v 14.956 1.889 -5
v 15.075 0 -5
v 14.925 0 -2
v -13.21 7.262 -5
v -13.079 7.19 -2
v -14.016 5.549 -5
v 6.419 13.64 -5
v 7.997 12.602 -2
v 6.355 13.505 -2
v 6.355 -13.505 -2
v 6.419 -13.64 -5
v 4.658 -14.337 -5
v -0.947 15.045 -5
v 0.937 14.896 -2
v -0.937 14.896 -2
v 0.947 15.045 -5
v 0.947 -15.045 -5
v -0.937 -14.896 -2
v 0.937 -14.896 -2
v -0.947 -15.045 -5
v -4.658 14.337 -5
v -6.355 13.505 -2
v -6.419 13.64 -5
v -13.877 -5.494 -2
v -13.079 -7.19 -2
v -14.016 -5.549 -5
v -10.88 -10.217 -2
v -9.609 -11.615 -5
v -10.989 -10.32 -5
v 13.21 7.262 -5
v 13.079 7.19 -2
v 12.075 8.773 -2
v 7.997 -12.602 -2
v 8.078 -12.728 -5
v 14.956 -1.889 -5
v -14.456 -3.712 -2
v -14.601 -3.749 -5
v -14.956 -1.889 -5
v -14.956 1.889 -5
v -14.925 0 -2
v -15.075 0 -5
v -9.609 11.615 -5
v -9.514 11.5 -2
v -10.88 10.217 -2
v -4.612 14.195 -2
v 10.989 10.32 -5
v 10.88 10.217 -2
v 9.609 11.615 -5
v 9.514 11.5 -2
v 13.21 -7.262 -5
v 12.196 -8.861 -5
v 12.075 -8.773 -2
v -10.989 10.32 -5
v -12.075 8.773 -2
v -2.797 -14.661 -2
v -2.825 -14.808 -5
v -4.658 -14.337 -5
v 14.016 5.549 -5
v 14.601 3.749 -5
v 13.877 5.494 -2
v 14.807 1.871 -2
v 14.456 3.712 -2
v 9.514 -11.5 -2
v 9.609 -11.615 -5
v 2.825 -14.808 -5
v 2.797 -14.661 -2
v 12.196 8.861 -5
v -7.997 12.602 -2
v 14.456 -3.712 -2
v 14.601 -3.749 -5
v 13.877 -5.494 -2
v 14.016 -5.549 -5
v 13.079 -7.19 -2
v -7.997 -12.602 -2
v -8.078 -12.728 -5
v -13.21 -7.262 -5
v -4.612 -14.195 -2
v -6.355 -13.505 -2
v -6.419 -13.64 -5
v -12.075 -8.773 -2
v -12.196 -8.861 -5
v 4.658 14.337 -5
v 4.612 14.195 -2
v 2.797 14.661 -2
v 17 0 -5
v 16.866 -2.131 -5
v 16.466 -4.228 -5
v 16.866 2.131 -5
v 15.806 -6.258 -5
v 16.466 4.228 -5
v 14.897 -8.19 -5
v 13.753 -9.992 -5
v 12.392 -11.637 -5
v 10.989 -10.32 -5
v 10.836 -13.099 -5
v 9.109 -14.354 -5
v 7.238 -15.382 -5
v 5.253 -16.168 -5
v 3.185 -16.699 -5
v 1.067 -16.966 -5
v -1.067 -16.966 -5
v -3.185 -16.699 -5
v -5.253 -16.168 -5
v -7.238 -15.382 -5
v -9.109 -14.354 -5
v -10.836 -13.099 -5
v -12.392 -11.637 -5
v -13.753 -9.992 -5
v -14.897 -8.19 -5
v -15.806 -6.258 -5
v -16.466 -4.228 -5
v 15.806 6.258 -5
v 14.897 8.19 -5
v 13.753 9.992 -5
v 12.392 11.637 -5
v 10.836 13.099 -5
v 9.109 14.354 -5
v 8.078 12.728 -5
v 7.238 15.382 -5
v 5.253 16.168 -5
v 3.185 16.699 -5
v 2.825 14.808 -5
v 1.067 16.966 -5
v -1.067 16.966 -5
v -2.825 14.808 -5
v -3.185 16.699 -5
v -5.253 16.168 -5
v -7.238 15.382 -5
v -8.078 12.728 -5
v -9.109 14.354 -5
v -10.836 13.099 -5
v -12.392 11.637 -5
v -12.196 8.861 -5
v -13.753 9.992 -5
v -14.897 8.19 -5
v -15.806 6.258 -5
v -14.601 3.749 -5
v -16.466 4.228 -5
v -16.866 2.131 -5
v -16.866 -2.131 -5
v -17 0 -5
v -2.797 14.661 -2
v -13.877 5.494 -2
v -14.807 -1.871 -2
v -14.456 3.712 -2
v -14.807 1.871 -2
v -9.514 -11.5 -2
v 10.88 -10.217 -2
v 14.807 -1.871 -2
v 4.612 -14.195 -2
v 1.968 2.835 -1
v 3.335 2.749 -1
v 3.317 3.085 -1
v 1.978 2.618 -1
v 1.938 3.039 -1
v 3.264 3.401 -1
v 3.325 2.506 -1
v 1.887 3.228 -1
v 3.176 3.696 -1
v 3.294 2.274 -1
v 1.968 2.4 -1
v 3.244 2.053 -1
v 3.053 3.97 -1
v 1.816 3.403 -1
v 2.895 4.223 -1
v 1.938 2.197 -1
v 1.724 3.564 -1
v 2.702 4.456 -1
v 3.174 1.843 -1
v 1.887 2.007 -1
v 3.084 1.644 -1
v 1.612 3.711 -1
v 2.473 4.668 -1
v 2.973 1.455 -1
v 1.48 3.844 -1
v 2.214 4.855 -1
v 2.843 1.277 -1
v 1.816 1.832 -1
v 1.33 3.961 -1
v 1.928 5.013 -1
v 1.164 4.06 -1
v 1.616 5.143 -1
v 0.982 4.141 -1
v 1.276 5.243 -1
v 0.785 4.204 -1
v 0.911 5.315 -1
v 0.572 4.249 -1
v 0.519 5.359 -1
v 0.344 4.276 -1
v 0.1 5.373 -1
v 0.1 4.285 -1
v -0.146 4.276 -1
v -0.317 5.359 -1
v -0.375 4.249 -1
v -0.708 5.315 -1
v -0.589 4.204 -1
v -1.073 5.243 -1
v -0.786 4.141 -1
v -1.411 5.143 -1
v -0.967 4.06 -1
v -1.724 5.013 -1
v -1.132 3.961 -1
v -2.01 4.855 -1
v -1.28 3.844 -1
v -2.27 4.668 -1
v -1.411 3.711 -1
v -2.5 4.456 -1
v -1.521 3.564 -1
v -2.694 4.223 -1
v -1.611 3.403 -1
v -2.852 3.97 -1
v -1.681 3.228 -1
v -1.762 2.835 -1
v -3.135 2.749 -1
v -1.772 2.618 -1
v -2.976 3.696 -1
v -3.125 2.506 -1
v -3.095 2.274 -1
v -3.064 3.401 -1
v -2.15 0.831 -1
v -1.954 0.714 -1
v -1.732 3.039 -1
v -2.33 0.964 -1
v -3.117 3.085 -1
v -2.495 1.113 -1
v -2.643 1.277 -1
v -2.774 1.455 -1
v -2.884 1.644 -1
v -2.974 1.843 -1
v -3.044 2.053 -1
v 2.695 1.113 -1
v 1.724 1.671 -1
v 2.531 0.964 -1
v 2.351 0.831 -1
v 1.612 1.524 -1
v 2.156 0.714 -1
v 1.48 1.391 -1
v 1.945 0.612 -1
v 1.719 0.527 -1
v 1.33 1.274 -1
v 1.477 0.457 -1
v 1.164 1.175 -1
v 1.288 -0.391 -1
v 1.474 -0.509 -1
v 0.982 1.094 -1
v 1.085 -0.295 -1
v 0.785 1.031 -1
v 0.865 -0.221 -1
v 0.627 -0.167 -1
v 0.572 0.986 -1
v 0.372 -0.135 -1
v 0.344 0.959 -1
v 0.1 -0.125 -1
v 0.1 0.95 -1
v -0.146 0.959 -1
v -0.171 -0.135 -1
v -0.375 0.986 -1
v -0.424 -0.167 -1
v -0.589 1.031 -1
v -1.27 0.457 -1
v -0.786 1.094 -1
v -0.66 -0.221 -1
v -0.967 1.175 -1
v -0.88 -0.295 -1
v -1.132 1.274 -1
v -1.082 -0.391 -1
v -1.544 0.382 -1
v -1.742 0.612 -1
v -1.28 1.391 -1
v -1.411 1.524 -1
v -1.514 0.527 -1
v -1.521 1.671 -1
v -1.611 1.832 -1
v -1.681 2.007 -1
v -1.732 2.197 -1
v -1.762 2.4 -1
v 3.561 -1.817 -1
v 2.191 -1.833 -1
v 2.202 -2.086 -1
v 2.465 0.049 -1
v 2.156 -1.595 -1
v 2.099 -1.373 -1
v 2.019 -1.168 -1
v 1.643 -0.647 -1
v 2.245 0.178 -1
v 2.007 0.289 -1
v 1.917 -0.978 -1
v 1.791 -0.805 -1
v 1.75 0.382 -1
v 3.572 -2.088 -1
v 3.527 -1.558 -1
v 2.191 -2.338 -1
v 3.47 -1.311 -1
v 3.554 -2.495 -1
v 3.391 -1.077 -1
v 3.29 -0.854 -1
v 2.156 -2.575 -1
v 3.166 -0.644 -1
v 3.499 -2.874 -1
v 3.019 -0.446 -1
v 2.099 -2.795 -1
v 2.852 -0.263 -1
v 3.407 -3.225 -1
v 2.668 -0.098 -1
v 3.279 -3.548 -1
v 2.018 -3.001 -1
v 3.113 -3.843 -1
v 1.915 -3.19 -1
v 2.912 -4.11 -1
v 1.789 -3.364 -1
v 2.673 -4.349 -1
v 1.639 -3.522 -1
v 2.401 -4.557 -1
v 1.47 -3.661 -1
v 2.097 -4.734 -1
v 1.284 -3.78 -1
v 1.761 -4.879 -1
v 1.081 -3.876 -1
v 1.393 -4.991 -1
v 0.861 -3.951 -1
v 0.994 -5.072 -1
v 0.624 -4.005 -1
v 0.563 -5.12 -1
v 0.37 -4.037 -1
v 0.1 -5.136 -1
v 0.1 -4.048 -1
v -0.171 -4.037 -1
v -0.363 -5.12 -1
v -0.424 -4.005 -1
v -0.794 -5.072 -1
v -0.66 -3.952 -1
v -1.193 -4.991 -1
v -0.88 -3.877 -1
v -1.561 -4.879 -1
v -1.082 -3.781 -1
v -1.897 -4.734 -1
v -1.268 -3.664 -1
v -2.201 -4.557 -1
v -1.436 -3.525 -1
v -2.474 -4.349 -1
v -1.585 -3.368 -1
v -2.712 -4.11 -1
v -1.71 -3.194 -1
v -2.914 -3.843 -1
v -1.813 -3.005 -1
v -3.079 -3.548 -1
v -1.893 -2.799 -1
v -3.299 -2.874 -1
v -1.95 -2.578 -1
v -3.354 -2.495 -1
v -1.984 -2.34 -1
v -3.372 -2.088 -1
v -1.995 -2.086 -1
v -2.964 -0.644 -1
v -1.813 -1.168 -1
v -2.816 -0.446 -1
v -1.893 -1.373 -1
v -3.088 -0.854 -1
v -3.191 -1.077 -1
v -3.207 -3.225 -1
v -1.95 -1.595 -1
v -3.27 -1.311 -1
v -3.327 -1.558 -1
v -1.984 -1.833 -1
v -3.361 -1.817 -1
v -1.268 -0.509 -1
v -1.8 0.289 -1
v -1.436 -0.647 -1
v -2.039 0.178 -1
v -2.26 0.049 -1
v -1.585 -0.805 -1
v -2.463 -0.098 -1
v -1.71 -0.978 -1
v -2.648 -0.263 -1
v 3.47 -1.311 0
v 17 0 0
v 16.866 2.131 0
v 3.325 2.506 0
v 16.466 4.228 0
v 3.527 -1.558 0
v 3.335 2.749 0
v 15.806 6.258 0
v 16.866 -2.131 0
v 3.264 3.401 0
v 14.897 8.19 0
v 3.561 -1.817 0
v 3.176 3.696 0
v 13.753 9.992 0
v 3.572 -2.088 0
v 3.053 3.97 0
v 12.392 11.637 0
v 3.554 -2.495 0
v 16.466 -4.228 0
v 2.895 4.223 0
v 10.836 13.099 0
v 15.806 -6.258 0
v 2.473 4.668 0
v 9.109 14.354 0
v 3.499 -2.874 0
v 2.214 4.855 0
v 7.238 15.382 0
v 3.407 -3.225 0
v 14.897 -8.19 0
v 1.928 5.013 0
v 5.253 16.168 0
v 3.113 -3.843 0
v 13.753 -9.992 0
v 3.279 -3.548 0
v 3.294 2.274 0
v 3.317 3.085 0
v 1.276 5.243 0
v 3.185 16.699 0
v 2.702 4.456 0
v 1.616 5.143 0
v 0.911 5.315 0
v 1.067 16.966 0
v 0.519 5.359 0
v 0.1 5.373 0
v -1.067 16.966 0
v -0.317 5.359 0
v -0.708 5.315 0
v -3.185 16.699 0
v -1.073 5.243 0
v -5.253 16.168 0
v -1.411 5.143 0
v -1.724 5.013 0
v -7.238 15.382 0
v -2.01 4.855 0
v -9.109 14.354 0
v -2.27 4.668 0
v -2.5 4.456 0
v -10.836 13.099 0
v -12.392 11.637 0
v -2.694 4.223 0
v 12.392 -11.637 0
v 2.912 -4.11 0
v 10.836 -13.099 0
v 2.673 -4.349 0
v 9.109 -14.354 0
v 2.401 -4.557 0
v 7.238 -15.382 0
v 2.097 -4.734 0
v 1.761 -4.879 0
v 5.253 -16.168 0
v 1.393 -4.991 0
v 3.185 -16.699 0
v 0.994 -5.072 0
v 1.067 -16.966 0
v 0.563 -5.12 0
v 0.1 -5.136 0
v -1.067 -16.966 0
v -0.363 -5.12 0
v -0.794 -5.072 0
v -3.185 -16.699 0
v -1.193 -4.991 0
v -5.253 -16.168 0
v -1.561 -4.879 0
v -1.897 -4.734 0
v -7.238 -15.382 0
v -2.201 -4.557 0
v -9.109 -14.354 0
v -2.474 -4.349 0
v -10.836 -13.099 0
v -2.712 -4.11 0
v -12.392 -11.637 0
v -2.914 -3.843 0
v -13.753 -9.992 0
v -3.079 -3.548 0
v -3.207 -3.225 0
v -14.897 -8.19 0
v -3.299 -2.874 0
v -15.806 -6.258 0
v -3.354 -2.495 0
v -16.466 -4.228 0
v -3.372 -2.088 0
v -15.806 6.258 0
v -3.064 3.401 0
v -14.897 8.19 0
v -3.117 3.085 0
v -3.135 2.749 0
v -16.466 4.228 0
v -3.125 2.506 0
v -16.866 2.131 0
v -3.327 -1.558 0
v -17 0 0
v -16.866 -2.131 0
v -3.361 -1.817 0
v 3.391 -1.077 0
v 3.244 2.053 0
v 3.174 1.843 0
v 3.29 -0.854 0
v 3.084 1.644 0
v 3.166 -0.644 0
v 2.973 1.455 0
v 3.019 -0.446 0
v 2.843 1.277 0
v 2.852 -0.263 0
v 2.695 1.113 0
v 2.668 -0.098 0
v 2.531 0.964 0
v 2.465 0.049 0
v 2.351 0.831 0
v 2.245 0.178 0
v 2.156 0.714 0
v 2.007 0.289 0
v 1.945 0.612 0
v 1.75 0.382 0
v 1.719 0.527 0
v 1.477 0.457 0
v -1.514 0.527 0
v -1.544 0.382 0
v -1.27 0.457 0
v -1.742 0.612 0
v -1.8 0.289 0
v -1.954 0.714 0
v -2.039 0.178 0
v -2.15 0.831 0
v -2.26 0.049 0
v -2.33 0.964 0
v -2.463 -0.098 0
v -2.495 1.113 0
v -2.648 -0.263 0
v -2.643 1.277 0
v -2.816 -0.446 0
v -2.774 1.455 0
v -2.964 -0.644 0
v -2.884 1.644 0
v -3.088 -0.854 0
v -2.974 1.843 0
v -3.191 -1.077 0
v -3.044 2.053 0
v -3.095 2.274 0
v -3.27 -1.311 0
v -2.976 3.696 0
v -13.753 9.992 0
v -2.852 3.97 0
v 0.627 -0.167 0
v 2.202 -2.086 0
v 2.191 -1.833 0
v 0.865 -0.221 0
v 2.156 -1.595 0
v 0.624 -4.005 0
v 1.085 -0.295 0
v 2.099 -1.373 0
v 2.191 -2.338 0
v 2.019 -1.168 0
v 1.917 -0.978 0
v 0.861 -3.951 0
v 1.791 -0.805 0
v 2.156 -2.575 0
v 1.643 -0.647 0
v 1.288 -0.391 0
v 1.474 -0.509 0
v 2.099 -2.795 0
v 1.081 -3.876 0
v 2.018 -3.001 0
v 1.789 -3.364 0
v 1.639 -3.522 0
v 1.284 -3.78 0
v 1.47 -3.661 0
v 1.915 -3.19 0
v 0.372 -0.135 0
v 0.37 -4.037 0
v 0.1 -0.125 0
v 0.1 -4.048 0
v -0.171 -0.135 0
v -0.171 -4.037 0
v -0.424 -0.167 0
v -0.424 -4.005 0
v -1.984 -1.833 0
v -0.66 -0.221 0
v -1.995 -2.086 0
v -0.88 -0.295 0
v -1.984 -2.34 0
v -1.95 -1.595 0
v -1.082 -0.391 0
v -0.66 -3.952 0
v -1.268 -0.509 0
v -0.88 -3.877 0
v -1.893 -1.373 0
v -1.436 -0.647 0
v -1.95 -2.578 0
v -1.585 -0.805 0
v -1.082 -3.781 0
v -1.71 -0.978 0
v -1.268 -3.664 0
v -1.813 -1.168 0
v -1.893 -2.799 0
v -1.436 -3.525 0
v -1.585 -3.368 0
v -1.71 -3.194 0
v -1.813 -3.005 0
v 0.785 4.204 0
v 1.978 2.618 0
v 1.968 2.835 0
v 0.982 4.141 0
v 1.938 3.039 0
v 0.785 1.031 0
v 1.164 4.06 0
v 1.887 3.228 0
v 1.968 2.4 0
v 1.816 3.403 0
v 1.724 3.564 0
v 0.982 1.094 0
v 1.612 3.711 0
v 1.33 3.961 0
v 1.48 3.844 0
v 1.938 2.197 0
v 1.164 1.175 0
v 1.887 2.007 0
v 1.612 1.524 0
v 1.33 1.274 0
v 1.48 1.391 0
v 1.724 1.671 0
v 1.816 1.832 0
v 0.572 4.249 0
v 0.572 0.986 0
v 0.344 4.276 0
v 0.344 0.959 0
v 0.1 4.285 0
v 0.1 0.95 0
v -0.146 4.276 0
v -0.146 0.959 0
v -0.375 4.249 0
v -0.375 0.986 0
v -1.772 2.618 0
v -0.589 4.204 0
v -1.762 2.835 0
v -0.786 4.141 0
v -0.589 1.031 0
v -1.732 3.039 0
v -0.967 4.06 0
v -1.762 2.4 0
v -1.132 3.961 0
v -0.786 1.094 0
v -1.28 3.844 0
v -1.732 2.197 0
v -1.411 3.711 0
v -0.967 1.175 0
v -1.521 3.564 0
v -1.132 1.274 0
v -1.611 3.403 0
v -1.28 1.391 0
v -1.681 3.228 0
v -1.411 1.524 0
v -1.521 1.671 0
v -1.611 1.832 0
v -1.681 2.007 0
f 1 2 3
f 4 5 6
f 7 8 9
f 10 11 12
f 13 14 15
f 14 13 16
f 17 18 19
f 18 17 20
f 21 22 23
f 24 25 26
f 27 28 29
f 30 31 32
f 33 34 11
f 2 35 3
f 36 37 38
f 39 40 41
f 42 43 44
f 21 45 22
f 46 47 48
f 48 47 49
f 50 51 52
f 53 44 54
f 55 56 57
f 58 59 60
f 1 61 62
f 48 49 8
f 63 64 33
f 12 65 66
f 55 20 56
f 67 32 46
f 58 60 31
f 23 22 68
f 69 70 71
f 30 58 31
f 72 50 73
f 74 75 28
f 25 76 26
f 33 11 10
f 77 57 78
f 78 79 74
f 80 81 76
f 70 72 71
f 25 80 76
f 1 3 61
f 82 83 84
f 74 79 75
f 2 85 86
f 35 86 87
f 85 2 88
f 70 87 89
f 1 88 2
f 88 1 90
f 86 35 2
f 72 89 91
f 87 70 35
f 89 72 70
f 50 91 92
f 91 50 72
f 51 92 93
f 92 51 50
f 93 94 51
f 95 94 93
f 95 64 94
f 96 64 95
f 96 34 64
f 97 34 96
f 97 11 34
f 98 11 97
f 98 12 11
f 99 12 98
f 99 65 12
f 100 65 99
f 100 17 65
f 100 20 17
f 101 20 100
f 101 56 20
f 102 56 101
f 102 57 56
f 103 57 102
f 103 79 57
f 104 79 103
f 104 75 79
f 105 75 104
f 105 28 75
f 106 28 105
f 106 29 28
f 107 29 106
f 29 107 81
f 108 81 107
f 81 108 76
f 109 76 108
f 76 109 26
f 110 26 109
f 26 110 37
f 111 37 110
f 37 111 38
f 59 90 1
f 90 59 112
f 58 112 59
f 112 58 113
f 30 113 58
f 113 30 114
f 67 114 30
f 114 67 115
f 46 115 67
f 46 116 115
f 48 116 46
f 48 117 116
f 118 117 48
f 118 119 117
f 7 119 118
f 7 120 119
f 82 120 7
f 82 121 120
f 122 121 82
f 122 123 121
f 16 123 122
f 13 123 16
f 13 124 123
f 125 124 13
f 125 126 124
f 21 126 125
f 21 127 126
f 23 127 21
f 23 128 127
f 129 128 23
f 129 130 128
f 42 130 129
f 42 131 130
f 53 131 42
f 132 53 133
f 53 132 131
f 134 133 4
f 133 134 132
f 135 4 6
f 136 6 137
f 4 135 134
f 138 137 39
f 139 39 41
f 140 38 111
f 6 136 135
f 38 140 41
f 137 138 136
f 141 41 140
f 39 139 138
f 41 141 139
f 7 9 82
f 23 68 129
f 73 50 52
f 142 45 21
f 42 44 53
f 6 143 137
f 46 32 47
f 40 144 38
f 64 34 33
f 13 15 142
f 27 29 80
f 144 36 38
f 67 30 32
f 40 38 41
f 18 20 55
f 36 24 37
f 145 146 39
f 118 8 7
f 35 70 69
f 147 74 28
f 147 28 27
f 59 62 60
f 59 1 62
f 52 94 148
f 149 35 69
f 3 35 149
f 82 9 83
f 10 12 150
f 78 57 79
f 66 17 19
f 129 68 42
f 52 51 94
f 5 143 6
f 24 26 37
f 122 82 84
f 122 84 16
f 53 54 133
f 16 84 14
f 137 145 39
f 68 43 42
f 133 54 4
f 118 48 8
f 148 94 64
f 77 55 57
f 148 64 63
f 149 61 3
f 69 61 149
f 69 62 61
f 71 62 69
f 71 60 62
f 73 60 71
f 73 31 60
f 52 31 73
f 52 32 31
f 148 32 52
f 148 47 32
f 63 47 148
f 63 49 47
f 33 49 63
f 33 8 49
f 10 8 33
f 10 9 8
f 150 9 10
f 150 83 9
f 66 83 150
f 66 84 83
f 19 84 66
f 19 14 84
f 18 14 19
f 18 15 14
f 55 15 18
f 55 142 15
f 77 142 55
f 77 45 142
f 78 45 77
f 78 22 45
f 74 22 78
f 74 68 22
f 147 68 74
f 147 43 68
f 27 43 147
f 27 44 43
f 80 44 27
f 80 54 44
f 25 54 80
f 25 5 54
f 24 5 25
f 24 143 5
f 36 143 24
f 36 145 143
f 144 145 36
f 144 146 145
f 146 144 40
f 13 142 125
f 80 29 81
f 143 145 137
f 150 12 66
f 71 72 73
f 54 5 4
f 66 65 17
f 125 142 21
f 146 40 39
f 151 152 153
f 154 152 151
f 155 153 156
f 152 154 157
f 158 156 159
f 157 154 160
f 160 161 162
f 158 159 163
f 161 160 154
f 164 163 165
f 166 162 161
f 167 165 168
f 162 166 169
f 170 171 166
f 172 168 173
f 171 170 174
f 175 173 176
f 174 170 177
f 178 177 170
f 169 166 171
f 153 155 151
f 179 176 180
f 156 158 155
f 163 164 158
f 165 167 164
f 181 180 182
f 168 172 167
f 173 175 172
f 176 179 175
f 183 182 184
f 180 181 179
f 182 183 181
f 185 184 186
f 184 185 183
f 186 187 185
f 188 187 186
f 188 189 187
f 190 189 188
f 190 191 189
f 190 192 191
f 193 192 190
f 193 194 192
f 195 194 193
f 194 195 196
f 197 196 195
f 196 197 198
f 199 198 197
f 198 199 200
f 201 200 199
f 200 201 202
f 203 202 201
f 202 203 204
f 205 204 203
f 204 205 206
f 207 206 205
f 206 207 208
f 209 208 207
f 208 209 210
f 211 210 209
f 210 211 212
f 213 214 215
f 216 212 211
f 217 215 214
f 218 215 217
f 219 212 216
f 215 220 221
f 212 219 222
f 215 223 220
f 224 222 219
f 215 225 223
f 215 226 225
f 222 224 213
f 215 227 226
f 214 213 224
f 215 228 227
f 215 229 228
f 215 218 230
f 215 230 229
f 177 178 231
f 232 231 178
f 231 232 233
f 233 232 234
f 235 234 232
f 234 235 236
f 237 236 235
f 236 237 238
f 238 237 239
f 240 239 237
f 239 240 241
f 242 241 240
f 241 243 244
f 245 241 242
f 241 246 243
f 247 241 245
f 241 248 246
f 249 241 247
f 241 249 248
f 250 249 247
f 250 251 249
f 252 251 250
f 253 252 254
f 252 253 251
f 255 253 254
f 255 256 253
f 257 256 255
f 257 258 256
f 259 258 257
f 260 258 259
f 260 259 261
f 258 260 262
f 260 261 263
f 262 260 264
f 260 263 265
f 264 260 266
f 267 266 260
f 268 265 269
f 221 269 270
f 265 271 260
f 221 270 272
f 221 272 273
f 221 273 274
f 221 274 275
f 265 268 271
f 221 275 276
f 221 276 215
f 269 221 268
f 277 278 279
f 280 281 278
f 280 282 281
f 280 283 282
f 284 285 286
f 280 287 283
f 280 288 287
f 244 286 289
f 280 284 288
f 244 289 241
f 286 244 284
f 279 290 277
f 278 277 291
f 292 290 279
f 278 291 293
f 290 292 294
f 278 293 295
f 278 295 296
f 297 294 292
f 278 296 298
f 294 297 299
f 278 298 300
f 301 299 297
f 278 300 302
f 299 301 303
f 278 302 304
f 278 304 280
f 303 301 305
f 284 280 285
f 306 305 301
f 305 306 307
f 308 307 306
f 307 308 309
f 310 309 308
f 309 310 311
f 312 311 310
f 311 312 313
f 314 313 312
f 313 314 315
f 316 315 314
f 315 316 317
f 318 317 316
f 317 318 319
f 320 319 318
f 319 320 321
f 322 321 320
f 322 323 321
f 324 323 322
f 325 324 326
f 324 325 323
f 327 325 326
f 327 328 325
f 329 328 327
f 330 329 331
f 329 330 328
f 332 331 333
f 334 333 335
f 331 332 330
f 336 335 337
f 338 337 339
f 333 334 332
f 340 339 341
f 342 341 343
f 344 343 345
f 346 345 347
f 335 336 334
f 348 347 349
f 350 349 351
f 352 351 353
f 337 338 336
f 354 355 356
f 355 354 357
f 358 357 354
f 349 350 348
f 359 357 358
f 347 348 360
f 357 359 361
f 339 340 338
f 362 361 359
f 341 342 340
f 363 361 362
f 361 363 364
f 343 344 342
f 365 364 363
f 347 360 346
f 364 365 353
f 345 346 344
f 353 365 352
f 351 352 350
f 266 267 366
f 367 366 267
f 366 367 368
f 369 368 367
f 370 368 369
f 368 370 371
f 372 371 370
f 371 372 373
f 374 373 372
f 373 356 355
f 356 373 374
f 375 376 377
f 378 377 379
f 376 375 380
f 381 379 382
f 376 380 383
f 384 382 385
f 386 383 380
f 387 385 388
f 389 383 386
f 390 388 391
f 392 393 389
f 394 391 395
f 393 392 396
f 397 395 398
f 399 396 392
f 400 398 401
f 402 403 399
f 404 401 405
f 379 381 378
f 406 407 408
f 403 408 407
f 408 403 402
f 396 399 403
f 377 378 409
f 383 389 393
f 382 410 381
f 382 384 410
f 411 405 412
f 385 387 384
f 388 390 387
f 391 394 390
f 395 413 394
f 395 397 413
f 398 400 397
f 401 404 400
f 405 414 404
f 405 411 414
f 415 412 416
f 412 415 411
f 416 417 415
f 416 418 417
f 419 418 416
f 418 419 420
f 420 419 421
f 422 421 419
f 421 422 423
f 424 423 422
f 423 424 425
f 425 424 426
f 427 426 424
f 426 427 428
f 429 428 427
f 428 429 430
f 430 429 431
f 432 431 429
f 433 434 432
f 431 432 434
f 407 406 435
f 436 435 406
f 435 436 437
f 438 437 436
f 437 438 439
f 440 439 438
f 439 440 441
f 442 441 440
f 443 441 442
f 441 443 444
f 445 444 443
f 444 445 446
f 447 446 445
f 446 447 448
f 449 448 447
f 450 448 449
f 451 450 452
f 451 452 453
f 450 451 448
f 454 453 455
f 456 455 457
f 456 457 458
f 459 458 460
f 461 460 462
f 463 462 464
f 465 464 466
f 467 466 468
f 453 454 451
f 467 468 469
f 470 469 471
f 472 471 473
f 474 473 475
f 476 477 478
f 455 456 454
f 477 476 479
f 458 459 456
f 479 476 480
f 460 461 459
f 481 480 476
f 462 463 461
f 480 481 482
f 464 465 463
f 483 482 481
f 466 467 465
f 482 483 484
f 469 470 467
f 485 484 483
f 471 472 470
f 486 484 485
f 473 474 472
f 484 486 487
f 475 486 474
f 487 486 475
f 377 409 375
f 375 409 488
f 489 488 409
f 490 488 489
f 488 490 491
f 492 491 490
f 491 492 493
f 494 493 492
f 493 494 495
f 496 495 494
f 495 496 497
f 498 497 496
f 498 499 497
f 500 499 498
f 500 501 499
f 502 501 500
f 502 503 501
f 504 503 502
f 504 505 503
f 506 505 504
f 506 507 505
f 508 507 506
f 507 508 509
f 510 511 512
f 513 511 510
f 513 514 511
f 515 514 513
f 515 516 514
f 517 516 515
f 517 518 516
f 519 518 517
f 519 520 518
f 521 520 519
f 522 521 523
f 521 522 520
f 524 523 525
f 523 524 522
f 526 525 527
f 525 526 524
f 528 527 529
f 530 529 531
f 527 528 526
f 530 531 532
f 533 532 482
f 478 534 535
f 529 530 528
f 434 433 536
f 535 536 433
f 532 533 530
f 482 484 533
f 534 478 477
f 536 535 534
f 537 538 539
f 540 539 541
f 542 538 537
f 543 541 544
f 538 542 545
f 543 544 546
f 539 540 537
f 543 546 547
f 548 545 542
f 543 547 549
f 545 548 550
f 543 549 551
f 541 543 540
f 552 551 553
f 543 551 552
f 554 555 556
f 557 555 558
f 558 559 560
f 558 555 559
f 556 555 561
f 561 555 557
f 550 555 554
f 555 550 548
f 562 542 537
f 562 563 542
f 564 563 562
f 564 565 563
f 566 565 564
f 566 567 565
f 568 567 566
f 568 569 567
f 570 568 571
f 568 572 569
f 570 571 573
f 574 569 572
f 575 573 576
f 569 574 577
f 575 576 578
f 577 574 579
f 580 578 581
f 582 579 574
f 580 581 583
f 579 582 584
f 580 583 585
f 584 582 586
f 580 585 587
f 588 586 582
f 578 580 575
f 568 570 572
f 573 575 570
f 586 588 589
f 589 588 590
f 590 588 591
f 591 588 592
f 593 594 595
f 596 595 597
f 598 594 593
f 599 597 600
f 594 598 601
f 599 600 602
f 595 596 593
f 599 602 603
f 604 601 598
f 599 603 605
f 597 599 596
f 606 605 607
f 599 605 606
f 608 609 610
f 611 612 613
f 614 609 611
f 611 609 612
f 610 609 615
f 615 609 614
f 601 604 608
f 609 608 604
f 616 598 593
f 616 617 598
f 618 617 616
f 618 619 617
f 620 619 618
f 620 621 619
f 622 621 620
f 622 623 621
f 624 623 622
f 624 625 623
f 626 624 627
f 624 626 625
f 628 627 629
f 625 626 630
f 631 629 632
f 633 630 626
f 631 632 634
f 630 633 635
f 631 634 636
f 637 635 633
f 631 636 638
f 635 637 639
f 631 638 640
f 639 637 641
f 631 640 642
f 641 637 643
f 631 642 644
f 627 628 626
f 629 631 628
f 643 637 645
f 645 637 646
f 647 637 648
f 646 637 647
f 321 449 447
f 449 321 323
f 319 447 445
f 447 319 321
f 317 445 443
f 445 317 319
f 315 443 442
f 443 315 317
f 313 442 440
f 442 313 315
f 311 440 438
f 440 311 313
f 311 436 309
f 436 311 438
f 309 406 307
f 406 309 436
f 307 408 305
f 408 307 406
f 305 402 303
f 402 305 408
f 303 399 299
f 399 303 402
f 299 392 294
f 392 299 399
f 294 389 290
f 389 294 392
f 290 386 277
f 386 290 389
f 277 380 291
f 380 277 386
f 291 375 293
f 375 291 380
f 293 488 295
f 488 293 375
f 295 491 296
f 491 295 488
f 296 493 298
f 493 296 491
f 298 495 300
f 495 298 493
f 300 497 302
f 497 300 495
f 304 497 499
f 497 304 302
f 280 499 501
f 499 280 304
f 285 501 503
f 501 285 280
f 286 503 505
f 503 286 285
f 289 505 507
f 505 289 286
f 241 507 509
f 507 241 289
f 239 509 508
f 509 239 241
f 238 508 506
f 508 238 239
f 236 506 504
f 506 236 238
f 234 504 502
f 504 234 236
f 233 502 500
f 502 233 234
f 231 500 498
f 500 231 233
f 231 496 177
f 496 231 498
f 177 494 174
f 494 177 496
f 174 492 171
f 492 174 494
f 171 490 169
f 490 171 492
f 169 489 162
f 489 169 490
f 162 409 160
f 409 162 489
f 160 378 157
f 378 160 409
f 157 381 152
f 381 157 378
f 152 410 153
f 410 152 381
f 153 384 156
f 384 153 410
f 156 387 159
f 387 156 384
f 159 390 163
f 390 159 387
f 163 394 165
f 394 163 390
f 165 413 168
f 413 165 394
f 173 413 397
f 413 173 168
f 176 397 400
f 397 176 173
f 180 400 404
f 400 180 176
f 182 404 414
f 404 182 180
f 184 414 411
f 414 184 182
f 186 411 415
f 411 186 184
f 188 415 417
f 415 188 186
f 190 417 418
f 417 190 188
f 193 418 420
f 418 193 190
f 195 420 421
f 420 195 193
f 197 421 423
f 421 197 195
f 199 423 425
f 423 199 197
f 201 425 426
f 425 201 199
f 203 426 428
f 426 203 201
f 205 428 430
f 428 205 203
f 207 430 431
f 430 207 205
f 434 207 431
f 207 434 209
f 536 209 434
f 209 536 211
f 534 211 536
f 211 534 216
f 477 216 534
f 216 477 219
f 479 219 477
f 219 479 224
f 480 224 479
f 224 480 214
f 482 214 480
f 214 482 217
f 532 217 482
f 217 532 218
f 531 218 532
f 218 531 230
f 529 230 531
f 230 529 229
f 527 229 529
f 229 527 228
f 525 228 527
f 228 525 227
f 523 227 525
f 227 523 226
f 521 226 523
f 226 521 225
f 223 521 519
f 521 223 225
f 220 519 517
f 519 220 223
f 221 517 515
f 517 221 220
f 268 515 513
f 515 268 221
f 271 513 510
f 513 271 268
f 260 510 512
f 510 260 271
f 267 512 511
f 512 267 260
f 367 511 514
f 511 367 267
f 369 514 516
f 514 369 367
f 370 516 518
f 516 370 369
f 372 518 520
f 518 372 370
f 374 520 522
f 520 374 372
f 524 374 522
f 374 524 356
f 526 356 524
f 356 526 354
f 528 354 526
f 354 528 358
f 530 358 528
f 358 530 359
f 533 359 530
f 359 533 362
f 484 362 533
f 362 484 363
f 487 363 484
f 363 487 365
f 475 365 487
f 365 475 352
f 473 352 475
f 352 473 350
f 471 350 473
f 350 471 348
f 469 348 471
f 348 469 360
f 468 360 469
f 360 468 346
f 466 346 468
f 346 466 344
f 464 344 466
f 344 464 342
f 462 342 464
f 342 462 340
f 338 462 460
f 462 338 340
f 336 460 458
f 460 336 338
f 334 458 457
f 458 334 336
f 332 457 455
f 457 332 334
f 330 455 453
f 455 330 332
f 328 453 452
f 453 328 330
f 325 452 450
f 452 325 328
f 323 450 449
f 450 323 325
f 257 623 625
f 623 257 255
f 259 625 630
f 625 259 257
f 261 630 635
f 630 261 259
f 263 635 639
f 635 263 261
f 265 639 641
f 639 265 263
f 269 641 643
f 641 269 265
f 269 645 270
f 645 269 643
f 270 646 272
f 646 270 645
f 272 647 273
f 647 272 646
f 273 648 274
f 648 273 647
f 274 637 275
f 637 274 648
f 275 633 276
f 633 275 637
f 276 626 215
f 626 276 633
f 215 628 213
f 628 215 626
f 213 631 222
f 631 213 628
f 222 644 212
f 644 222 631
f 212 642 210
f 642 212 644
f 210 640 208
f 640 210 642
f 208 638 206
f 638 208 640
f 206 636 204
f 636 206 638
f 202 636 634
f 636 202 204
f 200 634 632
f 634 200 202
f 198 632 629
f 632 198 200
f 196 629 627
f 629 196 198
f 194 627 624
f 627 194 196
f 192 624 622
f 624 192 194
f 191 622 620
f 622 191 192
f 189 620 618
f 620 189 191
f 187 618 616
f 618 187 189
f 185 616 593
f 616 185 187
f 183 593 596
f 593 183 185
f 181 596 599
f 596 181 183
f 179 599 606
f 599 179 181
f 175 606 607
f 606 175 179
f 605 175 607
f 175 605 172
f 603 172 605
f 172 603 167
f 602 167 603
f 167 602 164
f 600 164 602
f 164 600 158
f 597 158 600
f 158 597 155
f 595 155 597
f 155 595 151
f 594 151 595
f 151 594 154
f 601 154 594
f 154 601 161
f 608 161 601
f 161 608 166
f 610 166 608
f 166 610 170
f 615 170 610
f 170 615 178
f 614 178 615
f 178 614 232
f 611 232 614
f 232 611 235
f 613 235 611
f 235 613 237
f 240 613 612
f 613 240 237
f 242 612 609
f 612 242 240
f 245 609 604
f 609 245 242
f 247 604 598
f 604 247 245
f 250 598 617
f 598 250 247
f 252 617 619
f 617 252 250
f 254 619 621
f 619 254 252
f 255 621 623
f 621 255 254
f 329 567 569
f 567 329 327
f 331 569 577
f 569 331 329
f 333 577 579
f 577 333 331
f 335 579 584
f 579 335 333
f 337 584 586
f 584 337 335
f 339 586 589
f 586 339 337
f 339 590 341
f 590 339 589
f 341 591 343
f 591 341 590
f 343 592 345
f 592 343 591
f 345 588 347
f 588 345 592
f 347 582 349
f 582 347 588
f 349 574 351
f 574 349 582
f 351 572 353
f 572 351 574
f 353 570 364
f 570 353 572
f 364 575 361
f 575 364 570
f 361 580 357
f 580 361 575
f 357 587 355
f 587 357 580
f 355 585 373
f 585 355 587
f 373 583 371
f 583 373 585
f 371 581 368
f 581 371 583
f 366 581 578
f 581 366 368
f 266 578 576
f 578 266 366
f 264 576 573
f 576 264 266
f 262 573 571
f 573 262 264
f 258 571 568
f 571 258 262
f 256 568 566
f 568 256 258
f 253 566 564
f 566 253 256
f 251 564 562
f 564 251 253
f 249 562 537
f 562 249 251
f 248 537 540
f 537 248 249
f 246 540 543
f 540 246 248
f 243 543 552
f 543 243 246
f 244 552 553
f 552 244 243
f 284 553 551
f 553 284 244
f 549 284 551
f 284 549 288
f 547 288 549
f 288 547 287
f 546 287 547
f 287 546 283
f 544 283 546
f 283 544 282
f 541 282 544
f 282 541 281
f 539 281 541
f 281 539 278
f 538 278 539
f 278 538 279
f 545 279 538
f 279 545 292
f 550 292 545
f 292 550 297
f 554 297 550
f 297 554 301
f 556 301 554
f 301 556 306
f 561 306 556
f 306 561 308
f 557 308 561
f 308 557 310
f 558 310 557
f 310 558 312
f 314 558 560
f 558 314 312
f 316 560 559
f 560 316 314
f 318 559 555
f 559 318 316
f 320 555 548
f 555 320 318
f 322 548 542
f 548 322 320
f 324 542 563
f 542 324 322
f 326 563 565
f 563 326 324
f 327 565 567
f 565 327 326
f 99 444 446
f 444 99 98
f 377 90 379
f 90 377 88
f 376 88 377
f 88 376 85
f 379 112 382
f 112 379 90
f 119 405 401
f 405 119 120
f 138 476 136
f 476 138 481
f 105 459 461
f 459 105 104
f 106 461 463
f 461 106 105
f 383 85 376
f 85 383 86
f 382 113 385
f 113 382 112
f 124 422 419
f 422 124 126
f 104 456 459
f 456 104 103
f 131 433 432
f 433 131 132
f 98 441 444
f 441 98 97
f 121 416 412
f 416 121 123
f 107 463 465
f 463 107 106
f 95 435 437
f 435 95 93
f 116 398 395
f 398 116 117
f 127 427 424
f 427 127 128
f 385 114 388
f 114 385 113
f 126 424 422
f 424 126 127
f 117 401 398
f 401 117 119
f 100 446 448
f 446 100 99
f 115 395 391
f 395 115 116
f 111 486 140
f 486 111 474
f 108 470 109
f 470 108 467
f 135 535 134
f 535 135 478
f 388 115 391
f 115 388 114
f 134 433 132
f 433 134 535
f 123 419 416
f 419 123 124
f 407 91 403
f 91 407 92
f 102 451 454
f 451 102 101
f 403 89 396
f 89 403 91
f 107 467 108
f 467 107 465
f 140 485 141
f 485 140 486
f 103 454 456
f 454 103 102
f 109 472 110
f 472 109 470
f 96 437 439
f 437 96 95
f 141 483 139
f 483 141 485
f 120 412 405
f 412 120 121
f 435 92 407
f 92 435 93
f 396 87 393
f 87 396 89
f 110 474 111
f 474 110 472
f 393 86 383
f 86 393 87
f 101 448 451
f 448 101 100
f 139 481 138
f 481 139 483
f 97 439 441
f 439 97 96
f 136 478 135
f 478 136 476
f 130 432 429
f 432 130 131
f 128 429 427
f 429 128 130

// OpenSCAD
$fn = 50;


difference() {
	union() {
		translate(v = [0, 0, -5.0000000000]) {
			cylinder(h = 5, r = 17.0000000000);
		}
	}
	union() {
		#translate(v = [0, 0, -5.0000000000]) {
			cylinder(h = 3, r1 = 15.0750000000, r2 = 14.9250000000);
		}
		translate(v = [0, 0, -1]) {
			linear_extrude(height = 1) {
				text(font = "Impact", halign = "center", size = 10, text = "8", valign = "center");
			}
		}
	}
}
